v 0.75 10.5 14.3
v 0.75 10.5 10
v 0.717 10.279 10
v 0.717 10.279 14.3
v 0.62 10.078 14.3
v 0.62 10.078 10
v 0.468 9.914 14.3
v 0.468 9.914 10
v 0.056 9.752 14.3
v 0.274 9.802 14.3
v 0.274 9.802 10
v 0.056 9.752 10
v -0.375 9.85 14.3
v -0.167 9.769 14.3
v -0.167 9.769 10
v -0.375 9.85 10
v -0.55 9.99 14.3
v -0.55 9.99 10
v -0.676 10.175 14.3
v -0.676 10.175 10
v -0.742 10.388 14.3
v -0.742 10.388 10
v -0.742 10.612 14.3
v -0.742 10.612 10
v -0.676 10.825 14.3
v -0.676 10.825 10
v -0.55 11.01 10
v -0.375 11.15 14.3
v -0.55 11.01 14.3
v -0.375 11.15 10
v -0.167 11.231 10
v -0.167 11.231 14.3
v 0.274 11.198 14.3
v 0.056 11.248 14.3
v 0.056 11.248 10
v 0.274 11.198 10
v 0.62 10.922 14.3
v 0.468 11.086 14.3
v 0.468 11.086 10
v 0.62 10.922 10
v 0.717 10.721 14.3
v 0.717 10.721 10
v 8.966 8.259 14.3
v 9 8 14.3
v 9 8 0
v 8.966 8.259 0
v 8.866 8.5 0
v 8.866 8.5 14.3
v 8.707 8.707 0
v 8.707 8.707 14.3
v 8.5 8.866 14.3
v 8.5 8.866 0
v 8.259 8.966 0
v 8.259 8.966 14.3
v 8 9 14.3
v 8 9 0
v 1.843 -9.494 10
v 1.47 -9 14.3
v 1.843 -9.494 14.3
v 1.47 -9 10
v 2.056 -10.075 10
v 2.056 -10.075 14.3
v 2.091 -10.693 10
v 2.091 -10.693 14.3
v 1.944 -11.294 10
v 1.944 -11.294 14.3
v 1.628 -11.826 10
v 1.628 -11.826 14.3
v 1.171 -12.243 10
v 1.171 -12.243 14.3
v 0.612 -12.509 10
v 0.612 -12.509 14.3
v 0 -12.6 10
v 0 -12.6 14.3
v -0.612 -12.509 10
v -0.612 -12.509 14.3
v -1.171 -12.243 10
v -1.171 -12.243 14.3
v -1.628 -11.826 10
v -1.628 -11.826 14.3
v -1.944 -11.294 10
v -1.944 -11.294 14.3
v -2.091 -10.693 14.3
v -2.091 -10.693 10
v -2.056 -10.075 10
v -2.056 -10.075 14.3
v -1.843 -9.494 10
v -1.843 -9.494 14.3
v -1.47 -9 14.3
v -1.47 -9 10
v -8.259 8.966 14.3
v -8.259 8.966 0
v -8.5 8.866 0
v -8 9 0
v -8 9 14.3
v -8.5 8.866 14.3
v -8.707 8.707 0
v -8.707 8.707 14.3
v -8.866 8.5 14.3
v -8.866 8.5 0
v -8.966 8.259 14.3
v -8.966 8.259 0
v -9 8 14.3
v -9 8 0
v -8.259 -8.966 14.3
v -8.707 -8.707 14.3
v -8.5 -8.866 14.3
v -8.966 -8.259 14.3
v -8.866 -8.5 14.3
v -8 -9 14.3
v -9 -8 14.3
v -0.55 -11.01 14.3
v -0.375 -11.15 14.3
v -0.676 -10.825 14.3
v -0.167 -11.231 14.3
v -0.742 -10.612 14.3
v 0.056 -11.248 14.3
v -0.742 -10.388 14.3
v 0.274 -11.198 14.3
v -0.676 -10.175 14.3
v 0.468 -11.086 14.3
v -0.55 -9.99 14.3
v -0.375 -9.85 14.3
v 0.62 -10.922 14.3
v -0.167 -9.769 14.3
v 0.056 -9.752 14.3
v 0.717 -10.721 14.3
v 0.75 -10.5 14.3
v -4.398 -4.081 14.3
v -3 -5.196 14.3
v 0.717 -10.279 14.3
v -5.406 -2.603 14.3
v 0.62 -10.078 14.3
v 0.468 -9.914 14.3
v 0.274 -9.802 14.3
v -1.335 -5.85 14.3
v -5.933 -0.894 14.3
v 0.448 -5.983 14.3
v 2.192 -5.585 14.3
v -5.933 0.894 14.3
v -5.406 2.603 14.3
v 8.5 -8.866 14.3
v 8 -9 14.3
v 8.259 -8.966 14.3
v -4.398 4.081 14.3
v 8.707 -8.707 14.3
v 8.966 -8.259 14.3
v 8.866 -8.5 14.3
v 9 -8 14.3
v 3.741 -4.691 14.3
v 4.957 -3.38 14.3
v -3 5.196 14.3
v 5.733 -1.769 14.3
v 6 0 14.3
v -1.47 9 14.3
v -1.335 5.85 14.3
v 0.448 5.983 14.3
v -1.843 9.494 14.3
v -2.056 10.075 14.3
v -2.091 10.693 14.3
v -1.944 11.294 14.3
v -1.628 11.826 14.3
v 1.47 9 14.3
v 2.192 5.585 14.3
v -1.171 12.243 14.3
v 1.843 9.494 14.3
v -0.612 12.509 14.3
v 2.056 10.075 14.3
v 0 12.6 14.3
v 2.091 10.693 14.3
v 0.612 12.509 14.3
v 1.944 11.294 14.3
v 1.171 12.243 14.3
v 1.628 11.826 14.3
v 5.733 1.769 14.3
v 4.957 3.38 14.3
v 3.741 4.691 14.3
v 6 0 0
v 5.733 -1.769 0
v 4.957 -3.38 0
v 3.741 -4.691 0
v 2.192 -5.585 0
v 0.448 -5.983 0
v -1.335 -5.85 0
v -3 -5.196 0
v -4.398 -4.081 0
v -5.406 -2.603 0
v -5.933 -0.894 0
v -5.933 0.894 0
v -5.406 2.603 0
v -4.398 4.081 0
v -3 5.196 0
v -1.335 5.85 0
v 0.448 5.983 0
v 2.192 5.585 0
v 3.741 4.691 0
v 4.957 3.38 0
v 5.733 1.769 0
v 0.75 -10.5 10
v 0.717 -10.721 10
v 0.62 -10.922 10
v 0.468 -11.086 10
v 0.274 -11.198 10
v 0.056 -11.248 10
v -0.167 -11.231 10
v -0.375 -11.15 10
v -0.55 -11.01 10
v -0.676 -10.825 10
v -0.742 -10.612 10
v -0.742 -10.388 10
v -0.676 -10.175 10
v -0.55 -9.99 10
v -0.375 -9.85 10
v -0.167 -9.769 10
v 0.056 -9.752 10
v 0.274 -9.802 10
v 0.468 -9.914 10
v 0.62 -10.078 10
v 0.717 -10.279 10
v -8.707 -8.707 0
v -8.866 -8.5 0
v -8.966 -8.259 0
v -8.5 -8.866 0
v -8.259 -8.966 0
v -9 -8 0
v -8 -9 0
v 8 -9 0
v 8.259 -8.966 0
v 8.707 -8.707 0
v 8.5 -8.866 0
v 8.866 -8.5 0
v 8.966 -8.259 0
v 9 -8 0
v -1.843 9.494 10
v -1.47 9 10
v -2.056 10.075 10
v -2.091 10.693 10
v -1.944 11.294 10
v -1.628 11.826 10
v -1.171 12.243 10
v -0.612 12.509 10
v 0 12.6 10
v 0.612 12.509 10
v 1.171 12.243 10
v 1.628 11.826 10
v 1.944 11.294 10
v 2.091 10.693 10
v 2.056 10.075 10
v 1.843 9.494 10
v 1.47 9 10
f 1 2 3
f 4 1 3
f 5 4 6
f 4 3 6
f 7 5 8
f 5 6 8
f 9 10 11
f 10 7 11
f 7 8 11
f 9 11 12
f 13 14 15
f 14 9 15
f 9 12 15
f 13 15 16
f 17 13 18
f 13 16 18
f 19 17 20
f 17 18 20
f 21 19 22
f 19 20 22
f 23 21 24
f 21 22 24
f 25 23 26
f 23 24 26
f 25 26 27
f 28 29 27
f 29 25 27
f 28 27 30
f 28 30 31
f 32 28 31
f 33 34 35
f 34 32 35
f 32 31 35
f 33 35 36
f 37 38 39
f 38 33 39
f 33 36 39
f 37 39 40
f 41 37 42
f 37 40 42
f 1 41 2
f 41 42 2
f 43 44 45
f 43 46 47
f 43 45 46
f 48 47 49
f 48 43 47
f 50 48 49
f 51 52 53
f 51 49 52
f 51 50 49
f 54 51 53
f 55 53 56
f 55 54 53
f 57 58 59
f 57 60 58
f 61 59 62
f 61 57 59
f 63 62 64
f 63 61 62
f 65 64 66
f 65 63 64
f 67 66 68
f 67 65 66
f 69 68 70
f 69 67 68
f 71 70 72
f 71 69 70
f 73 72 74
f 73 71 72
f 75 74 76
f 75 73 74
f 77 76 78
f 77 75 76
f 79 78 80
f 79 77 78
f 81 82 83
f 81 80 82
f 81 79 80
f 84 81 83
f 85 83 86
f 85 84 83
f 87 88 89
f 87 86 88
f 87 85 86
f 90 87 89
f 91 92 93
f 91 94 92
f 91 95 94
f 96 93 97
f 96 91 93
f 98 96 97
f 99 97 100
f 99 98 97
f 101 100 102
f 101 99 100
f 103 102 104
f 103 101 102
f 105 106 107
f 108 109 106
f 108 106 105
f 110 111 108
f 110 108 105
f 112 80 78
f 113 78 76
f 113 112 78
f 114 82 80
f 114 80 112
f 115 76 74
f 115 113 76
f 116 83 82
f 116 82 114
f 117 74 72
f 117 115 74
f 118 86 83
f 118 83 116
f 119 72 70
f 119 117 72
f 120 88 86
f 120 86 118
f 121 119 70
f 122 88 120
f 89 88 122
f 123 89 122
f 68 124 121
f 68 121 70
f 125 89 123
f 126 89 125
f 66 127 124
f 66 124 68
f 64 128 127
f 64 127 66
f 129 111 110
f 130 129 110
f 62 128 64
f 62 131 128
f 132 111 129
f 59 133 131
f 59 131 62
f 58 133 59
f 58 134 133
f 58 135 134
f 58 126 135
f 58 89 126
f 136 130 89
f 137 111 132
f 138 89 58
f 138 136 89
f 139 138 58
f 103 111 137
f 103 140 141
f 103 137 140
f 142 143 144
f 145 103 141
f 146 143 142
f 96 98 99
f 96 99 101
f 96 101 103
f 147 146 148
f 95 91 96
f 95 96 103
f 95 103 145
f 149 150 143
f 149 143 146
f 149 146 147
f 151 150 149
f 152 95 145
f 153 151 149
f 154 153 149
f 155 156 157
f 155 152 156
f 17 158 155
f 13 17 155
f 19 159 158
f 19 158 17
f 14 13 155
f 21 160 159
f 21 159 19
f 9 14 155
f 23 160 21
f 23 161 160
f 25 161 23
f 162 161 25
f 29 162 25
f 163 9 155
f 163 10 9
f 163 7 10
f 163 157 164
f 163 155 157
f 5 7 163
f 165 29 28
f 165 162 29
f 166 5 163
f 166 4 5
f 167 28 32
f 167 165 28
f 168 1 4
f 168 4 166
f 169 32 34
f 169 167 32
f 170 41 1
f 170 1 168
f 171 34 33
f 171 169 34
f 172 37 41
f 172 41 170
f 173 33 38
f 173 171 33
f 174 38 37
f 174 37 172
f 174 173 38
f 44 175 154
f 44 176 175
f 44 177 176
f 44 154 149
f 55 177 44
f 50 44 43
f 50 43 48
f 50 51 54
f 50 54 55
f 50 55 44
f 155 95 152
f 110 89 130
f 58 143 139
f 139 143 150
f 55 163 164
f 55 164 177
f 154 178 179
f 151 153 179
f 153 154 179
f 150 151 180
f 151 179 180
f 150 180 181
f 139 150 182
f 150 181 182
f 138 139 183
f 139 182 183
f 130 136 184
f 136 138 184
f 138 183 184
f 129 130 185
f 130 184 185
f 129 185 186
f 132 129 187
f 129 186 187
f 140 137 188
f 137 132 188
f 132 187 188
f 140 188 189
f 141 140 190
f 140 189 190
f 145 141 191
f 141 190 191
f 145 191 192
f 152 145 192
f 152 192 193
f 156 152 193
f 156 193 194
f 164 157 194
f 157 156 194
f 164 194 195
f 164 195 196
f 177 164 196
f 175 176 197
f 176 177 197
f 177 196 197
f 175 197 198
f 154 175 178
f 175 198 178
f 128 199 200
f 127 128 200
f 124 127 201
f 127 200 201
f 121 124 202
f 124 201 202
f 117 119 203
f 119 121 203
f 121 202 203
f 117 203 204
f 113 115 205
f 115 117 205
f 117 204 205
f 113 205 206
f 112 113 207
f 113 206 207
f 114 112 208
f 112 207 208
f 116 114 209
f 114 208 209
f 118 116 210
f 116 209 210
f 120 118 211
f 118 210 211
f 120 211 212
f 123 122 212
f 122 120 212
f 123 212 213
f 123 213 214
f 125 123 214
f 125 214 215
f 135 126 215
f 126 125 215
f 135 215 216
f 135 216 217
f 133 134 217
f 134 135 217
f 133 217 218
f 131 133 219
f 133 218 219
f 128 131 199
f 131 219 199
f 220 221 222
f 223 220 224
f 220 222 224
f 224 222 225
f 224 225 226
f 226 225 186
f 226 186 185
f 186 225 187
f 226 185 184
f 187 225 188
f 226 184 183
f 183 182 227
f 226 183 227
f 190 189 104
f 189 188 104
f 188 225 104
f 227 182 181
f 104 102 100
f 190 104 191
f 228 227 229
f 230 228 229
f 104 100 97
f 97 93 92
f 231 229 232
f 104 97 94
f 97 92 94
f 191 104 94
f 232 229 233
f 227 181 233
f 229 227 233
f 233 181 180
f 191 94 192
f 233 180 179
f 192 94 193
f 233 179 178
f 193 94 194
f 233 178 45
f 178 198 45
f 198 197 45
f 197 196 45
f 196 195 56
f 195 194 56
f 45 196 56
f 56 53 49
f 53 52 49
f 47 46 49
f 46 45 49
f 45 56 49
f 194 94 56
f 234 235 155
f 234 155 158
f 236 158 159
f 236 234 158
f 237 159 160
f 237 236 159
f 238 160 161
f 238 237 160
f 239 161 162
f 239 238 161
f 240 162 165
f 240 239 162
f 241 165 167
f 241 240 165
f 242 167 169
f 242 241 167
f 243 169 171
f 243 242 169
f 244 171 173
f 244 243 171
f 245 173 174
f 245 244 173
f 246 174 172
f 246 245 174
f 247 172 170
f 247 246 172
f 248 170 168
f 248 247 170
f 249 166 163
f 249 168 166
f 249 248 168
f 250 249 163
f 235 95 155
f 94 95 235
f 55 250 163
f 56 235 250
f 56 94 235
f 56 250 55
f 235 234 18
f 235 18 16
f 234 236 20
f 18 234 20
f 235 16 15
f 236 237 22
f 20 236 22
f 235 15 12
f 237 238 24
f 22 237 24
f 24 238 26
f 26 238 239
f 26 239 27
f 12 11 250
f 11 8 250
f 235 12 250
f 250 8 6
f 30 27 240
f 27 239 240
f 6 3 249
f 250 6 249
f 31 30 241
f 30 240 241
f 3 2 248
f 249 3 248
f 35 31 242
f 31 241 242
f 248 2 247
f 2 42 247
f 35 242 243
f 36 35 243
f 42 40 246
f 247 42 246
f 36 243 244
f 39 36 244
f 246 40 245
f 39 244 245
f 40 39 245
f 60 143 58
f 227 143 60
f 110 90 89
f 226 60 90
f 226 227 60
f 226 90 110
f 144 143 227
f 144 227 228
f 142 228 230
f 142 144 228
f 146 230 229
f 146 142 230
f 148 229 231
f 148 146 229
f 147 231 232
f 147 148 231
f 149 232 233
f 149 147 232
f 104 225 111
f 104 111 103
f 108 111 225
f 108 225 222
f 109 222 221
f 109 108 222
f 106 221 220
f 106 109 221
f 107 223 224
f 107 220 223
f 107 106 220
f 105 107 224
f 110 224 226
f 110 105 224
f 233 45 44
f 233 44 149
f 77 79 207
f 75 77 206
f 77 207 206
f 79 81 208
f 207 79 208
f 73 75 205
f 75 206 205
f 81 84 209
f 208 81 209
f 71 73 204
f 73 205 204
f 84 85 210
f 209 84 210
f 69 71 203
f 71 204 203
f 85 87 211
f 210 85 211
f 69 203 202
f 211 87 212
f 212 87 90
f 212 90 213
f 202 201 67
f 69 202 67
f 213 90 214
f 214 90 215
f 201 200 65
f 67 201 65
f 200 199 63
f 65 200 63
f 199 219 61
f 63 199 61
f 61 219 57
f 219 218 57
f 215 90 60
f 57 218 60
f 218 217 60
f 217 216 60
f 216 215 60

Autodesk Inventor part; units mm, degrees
ref_plane "YZ Plane" through (0, 0, 0) normal (1, 0, 0) x (0, 1, 0)
ref_plane "XZ Plane" through (0, 0, 0) normal (0, 1, 0) x (-1, 0, 0)
ref_plane "XY Plane" through (0, 0, 0) normal (0, 0, 1) x (1, 0, 0)
sketch "Skizze1" plane through (0, 0, 0) normal (0, 0, 1) x (1, 0, 0)
  line L0 (9, -9) -> (-9, -9)
  line L1 (-9, -9) -> (-9, 9)
  line L2 (-9, 9) -> (9, 9)
  line L3 (9, 9) -> (9, -9)
  line L4 (9, -9) -> (-9, 9) construction
  line L5 (-9, -9) -> (9, 9) construction
  circle A0 centre (0, 0) radius 6
  dimension "d0" = 18
  dimension "d1" = 18
  dimension "d2" = 12
extrude "Extrusion1" add sketch "Skizze1" along normal blind 10
fillet "Rundung1" radius 1 4 edges at (9, 9, 5) (-9, 9, 5) (9, -9, 5) (-9, -9, 5)
sketch "Skizze2" plane through (0, 0, 10) normal (0, 0, 1) x (1, 0, 0)
  arc A0 (-9, -8) -> (-8, -9) centre (-8, -8) ccw projected
  line L0 (-8, -9) -> (8, -9) projected
  arc A1 (8, -9) -> (9, -8) centre (8, -8) ccw projected
  line L1 (9, -8) -> (9, 8) projected
  arc A2 (9, 8) -> (8, 9) centre (8, 8) ccw projected
  line L2 (8, 9) -> (-8, 9) projected
  arc A3 (-8, 9) -> (-9, 8) centre (-8, 8) ccw projected
  line L3 (-9, 8) -> (-9, -8) projected
  circle A4 centre (0, 0) radius 6 projected
  circle A5 centre (0, 10.5) radius 0.75
  circle A6 centre (0, -10.5) radius 0.75
  circle A7 centre (0, 10.5) radius 2.1
  circle A8 centre (0, -10.5) radius 2.1
  point P0 (-1.4697, -9)
  point P1 (1.4697, -9)
  point P2 (1.4697, 9)
  point P3 (-1.4697, 9)
  dimension "d6" = 1.5
  dimension "d7" = 1.5
  dimension "d8" = 10.5
  dimension "d9" = 10.5
  dimension "d10" = 4.2
  dimension "d11" = 4.2
extrude "Extrusion2" add sketch "Skizze2" along normal blind 4.3
properties part number "00_CCTV_M12_VCM_large"
